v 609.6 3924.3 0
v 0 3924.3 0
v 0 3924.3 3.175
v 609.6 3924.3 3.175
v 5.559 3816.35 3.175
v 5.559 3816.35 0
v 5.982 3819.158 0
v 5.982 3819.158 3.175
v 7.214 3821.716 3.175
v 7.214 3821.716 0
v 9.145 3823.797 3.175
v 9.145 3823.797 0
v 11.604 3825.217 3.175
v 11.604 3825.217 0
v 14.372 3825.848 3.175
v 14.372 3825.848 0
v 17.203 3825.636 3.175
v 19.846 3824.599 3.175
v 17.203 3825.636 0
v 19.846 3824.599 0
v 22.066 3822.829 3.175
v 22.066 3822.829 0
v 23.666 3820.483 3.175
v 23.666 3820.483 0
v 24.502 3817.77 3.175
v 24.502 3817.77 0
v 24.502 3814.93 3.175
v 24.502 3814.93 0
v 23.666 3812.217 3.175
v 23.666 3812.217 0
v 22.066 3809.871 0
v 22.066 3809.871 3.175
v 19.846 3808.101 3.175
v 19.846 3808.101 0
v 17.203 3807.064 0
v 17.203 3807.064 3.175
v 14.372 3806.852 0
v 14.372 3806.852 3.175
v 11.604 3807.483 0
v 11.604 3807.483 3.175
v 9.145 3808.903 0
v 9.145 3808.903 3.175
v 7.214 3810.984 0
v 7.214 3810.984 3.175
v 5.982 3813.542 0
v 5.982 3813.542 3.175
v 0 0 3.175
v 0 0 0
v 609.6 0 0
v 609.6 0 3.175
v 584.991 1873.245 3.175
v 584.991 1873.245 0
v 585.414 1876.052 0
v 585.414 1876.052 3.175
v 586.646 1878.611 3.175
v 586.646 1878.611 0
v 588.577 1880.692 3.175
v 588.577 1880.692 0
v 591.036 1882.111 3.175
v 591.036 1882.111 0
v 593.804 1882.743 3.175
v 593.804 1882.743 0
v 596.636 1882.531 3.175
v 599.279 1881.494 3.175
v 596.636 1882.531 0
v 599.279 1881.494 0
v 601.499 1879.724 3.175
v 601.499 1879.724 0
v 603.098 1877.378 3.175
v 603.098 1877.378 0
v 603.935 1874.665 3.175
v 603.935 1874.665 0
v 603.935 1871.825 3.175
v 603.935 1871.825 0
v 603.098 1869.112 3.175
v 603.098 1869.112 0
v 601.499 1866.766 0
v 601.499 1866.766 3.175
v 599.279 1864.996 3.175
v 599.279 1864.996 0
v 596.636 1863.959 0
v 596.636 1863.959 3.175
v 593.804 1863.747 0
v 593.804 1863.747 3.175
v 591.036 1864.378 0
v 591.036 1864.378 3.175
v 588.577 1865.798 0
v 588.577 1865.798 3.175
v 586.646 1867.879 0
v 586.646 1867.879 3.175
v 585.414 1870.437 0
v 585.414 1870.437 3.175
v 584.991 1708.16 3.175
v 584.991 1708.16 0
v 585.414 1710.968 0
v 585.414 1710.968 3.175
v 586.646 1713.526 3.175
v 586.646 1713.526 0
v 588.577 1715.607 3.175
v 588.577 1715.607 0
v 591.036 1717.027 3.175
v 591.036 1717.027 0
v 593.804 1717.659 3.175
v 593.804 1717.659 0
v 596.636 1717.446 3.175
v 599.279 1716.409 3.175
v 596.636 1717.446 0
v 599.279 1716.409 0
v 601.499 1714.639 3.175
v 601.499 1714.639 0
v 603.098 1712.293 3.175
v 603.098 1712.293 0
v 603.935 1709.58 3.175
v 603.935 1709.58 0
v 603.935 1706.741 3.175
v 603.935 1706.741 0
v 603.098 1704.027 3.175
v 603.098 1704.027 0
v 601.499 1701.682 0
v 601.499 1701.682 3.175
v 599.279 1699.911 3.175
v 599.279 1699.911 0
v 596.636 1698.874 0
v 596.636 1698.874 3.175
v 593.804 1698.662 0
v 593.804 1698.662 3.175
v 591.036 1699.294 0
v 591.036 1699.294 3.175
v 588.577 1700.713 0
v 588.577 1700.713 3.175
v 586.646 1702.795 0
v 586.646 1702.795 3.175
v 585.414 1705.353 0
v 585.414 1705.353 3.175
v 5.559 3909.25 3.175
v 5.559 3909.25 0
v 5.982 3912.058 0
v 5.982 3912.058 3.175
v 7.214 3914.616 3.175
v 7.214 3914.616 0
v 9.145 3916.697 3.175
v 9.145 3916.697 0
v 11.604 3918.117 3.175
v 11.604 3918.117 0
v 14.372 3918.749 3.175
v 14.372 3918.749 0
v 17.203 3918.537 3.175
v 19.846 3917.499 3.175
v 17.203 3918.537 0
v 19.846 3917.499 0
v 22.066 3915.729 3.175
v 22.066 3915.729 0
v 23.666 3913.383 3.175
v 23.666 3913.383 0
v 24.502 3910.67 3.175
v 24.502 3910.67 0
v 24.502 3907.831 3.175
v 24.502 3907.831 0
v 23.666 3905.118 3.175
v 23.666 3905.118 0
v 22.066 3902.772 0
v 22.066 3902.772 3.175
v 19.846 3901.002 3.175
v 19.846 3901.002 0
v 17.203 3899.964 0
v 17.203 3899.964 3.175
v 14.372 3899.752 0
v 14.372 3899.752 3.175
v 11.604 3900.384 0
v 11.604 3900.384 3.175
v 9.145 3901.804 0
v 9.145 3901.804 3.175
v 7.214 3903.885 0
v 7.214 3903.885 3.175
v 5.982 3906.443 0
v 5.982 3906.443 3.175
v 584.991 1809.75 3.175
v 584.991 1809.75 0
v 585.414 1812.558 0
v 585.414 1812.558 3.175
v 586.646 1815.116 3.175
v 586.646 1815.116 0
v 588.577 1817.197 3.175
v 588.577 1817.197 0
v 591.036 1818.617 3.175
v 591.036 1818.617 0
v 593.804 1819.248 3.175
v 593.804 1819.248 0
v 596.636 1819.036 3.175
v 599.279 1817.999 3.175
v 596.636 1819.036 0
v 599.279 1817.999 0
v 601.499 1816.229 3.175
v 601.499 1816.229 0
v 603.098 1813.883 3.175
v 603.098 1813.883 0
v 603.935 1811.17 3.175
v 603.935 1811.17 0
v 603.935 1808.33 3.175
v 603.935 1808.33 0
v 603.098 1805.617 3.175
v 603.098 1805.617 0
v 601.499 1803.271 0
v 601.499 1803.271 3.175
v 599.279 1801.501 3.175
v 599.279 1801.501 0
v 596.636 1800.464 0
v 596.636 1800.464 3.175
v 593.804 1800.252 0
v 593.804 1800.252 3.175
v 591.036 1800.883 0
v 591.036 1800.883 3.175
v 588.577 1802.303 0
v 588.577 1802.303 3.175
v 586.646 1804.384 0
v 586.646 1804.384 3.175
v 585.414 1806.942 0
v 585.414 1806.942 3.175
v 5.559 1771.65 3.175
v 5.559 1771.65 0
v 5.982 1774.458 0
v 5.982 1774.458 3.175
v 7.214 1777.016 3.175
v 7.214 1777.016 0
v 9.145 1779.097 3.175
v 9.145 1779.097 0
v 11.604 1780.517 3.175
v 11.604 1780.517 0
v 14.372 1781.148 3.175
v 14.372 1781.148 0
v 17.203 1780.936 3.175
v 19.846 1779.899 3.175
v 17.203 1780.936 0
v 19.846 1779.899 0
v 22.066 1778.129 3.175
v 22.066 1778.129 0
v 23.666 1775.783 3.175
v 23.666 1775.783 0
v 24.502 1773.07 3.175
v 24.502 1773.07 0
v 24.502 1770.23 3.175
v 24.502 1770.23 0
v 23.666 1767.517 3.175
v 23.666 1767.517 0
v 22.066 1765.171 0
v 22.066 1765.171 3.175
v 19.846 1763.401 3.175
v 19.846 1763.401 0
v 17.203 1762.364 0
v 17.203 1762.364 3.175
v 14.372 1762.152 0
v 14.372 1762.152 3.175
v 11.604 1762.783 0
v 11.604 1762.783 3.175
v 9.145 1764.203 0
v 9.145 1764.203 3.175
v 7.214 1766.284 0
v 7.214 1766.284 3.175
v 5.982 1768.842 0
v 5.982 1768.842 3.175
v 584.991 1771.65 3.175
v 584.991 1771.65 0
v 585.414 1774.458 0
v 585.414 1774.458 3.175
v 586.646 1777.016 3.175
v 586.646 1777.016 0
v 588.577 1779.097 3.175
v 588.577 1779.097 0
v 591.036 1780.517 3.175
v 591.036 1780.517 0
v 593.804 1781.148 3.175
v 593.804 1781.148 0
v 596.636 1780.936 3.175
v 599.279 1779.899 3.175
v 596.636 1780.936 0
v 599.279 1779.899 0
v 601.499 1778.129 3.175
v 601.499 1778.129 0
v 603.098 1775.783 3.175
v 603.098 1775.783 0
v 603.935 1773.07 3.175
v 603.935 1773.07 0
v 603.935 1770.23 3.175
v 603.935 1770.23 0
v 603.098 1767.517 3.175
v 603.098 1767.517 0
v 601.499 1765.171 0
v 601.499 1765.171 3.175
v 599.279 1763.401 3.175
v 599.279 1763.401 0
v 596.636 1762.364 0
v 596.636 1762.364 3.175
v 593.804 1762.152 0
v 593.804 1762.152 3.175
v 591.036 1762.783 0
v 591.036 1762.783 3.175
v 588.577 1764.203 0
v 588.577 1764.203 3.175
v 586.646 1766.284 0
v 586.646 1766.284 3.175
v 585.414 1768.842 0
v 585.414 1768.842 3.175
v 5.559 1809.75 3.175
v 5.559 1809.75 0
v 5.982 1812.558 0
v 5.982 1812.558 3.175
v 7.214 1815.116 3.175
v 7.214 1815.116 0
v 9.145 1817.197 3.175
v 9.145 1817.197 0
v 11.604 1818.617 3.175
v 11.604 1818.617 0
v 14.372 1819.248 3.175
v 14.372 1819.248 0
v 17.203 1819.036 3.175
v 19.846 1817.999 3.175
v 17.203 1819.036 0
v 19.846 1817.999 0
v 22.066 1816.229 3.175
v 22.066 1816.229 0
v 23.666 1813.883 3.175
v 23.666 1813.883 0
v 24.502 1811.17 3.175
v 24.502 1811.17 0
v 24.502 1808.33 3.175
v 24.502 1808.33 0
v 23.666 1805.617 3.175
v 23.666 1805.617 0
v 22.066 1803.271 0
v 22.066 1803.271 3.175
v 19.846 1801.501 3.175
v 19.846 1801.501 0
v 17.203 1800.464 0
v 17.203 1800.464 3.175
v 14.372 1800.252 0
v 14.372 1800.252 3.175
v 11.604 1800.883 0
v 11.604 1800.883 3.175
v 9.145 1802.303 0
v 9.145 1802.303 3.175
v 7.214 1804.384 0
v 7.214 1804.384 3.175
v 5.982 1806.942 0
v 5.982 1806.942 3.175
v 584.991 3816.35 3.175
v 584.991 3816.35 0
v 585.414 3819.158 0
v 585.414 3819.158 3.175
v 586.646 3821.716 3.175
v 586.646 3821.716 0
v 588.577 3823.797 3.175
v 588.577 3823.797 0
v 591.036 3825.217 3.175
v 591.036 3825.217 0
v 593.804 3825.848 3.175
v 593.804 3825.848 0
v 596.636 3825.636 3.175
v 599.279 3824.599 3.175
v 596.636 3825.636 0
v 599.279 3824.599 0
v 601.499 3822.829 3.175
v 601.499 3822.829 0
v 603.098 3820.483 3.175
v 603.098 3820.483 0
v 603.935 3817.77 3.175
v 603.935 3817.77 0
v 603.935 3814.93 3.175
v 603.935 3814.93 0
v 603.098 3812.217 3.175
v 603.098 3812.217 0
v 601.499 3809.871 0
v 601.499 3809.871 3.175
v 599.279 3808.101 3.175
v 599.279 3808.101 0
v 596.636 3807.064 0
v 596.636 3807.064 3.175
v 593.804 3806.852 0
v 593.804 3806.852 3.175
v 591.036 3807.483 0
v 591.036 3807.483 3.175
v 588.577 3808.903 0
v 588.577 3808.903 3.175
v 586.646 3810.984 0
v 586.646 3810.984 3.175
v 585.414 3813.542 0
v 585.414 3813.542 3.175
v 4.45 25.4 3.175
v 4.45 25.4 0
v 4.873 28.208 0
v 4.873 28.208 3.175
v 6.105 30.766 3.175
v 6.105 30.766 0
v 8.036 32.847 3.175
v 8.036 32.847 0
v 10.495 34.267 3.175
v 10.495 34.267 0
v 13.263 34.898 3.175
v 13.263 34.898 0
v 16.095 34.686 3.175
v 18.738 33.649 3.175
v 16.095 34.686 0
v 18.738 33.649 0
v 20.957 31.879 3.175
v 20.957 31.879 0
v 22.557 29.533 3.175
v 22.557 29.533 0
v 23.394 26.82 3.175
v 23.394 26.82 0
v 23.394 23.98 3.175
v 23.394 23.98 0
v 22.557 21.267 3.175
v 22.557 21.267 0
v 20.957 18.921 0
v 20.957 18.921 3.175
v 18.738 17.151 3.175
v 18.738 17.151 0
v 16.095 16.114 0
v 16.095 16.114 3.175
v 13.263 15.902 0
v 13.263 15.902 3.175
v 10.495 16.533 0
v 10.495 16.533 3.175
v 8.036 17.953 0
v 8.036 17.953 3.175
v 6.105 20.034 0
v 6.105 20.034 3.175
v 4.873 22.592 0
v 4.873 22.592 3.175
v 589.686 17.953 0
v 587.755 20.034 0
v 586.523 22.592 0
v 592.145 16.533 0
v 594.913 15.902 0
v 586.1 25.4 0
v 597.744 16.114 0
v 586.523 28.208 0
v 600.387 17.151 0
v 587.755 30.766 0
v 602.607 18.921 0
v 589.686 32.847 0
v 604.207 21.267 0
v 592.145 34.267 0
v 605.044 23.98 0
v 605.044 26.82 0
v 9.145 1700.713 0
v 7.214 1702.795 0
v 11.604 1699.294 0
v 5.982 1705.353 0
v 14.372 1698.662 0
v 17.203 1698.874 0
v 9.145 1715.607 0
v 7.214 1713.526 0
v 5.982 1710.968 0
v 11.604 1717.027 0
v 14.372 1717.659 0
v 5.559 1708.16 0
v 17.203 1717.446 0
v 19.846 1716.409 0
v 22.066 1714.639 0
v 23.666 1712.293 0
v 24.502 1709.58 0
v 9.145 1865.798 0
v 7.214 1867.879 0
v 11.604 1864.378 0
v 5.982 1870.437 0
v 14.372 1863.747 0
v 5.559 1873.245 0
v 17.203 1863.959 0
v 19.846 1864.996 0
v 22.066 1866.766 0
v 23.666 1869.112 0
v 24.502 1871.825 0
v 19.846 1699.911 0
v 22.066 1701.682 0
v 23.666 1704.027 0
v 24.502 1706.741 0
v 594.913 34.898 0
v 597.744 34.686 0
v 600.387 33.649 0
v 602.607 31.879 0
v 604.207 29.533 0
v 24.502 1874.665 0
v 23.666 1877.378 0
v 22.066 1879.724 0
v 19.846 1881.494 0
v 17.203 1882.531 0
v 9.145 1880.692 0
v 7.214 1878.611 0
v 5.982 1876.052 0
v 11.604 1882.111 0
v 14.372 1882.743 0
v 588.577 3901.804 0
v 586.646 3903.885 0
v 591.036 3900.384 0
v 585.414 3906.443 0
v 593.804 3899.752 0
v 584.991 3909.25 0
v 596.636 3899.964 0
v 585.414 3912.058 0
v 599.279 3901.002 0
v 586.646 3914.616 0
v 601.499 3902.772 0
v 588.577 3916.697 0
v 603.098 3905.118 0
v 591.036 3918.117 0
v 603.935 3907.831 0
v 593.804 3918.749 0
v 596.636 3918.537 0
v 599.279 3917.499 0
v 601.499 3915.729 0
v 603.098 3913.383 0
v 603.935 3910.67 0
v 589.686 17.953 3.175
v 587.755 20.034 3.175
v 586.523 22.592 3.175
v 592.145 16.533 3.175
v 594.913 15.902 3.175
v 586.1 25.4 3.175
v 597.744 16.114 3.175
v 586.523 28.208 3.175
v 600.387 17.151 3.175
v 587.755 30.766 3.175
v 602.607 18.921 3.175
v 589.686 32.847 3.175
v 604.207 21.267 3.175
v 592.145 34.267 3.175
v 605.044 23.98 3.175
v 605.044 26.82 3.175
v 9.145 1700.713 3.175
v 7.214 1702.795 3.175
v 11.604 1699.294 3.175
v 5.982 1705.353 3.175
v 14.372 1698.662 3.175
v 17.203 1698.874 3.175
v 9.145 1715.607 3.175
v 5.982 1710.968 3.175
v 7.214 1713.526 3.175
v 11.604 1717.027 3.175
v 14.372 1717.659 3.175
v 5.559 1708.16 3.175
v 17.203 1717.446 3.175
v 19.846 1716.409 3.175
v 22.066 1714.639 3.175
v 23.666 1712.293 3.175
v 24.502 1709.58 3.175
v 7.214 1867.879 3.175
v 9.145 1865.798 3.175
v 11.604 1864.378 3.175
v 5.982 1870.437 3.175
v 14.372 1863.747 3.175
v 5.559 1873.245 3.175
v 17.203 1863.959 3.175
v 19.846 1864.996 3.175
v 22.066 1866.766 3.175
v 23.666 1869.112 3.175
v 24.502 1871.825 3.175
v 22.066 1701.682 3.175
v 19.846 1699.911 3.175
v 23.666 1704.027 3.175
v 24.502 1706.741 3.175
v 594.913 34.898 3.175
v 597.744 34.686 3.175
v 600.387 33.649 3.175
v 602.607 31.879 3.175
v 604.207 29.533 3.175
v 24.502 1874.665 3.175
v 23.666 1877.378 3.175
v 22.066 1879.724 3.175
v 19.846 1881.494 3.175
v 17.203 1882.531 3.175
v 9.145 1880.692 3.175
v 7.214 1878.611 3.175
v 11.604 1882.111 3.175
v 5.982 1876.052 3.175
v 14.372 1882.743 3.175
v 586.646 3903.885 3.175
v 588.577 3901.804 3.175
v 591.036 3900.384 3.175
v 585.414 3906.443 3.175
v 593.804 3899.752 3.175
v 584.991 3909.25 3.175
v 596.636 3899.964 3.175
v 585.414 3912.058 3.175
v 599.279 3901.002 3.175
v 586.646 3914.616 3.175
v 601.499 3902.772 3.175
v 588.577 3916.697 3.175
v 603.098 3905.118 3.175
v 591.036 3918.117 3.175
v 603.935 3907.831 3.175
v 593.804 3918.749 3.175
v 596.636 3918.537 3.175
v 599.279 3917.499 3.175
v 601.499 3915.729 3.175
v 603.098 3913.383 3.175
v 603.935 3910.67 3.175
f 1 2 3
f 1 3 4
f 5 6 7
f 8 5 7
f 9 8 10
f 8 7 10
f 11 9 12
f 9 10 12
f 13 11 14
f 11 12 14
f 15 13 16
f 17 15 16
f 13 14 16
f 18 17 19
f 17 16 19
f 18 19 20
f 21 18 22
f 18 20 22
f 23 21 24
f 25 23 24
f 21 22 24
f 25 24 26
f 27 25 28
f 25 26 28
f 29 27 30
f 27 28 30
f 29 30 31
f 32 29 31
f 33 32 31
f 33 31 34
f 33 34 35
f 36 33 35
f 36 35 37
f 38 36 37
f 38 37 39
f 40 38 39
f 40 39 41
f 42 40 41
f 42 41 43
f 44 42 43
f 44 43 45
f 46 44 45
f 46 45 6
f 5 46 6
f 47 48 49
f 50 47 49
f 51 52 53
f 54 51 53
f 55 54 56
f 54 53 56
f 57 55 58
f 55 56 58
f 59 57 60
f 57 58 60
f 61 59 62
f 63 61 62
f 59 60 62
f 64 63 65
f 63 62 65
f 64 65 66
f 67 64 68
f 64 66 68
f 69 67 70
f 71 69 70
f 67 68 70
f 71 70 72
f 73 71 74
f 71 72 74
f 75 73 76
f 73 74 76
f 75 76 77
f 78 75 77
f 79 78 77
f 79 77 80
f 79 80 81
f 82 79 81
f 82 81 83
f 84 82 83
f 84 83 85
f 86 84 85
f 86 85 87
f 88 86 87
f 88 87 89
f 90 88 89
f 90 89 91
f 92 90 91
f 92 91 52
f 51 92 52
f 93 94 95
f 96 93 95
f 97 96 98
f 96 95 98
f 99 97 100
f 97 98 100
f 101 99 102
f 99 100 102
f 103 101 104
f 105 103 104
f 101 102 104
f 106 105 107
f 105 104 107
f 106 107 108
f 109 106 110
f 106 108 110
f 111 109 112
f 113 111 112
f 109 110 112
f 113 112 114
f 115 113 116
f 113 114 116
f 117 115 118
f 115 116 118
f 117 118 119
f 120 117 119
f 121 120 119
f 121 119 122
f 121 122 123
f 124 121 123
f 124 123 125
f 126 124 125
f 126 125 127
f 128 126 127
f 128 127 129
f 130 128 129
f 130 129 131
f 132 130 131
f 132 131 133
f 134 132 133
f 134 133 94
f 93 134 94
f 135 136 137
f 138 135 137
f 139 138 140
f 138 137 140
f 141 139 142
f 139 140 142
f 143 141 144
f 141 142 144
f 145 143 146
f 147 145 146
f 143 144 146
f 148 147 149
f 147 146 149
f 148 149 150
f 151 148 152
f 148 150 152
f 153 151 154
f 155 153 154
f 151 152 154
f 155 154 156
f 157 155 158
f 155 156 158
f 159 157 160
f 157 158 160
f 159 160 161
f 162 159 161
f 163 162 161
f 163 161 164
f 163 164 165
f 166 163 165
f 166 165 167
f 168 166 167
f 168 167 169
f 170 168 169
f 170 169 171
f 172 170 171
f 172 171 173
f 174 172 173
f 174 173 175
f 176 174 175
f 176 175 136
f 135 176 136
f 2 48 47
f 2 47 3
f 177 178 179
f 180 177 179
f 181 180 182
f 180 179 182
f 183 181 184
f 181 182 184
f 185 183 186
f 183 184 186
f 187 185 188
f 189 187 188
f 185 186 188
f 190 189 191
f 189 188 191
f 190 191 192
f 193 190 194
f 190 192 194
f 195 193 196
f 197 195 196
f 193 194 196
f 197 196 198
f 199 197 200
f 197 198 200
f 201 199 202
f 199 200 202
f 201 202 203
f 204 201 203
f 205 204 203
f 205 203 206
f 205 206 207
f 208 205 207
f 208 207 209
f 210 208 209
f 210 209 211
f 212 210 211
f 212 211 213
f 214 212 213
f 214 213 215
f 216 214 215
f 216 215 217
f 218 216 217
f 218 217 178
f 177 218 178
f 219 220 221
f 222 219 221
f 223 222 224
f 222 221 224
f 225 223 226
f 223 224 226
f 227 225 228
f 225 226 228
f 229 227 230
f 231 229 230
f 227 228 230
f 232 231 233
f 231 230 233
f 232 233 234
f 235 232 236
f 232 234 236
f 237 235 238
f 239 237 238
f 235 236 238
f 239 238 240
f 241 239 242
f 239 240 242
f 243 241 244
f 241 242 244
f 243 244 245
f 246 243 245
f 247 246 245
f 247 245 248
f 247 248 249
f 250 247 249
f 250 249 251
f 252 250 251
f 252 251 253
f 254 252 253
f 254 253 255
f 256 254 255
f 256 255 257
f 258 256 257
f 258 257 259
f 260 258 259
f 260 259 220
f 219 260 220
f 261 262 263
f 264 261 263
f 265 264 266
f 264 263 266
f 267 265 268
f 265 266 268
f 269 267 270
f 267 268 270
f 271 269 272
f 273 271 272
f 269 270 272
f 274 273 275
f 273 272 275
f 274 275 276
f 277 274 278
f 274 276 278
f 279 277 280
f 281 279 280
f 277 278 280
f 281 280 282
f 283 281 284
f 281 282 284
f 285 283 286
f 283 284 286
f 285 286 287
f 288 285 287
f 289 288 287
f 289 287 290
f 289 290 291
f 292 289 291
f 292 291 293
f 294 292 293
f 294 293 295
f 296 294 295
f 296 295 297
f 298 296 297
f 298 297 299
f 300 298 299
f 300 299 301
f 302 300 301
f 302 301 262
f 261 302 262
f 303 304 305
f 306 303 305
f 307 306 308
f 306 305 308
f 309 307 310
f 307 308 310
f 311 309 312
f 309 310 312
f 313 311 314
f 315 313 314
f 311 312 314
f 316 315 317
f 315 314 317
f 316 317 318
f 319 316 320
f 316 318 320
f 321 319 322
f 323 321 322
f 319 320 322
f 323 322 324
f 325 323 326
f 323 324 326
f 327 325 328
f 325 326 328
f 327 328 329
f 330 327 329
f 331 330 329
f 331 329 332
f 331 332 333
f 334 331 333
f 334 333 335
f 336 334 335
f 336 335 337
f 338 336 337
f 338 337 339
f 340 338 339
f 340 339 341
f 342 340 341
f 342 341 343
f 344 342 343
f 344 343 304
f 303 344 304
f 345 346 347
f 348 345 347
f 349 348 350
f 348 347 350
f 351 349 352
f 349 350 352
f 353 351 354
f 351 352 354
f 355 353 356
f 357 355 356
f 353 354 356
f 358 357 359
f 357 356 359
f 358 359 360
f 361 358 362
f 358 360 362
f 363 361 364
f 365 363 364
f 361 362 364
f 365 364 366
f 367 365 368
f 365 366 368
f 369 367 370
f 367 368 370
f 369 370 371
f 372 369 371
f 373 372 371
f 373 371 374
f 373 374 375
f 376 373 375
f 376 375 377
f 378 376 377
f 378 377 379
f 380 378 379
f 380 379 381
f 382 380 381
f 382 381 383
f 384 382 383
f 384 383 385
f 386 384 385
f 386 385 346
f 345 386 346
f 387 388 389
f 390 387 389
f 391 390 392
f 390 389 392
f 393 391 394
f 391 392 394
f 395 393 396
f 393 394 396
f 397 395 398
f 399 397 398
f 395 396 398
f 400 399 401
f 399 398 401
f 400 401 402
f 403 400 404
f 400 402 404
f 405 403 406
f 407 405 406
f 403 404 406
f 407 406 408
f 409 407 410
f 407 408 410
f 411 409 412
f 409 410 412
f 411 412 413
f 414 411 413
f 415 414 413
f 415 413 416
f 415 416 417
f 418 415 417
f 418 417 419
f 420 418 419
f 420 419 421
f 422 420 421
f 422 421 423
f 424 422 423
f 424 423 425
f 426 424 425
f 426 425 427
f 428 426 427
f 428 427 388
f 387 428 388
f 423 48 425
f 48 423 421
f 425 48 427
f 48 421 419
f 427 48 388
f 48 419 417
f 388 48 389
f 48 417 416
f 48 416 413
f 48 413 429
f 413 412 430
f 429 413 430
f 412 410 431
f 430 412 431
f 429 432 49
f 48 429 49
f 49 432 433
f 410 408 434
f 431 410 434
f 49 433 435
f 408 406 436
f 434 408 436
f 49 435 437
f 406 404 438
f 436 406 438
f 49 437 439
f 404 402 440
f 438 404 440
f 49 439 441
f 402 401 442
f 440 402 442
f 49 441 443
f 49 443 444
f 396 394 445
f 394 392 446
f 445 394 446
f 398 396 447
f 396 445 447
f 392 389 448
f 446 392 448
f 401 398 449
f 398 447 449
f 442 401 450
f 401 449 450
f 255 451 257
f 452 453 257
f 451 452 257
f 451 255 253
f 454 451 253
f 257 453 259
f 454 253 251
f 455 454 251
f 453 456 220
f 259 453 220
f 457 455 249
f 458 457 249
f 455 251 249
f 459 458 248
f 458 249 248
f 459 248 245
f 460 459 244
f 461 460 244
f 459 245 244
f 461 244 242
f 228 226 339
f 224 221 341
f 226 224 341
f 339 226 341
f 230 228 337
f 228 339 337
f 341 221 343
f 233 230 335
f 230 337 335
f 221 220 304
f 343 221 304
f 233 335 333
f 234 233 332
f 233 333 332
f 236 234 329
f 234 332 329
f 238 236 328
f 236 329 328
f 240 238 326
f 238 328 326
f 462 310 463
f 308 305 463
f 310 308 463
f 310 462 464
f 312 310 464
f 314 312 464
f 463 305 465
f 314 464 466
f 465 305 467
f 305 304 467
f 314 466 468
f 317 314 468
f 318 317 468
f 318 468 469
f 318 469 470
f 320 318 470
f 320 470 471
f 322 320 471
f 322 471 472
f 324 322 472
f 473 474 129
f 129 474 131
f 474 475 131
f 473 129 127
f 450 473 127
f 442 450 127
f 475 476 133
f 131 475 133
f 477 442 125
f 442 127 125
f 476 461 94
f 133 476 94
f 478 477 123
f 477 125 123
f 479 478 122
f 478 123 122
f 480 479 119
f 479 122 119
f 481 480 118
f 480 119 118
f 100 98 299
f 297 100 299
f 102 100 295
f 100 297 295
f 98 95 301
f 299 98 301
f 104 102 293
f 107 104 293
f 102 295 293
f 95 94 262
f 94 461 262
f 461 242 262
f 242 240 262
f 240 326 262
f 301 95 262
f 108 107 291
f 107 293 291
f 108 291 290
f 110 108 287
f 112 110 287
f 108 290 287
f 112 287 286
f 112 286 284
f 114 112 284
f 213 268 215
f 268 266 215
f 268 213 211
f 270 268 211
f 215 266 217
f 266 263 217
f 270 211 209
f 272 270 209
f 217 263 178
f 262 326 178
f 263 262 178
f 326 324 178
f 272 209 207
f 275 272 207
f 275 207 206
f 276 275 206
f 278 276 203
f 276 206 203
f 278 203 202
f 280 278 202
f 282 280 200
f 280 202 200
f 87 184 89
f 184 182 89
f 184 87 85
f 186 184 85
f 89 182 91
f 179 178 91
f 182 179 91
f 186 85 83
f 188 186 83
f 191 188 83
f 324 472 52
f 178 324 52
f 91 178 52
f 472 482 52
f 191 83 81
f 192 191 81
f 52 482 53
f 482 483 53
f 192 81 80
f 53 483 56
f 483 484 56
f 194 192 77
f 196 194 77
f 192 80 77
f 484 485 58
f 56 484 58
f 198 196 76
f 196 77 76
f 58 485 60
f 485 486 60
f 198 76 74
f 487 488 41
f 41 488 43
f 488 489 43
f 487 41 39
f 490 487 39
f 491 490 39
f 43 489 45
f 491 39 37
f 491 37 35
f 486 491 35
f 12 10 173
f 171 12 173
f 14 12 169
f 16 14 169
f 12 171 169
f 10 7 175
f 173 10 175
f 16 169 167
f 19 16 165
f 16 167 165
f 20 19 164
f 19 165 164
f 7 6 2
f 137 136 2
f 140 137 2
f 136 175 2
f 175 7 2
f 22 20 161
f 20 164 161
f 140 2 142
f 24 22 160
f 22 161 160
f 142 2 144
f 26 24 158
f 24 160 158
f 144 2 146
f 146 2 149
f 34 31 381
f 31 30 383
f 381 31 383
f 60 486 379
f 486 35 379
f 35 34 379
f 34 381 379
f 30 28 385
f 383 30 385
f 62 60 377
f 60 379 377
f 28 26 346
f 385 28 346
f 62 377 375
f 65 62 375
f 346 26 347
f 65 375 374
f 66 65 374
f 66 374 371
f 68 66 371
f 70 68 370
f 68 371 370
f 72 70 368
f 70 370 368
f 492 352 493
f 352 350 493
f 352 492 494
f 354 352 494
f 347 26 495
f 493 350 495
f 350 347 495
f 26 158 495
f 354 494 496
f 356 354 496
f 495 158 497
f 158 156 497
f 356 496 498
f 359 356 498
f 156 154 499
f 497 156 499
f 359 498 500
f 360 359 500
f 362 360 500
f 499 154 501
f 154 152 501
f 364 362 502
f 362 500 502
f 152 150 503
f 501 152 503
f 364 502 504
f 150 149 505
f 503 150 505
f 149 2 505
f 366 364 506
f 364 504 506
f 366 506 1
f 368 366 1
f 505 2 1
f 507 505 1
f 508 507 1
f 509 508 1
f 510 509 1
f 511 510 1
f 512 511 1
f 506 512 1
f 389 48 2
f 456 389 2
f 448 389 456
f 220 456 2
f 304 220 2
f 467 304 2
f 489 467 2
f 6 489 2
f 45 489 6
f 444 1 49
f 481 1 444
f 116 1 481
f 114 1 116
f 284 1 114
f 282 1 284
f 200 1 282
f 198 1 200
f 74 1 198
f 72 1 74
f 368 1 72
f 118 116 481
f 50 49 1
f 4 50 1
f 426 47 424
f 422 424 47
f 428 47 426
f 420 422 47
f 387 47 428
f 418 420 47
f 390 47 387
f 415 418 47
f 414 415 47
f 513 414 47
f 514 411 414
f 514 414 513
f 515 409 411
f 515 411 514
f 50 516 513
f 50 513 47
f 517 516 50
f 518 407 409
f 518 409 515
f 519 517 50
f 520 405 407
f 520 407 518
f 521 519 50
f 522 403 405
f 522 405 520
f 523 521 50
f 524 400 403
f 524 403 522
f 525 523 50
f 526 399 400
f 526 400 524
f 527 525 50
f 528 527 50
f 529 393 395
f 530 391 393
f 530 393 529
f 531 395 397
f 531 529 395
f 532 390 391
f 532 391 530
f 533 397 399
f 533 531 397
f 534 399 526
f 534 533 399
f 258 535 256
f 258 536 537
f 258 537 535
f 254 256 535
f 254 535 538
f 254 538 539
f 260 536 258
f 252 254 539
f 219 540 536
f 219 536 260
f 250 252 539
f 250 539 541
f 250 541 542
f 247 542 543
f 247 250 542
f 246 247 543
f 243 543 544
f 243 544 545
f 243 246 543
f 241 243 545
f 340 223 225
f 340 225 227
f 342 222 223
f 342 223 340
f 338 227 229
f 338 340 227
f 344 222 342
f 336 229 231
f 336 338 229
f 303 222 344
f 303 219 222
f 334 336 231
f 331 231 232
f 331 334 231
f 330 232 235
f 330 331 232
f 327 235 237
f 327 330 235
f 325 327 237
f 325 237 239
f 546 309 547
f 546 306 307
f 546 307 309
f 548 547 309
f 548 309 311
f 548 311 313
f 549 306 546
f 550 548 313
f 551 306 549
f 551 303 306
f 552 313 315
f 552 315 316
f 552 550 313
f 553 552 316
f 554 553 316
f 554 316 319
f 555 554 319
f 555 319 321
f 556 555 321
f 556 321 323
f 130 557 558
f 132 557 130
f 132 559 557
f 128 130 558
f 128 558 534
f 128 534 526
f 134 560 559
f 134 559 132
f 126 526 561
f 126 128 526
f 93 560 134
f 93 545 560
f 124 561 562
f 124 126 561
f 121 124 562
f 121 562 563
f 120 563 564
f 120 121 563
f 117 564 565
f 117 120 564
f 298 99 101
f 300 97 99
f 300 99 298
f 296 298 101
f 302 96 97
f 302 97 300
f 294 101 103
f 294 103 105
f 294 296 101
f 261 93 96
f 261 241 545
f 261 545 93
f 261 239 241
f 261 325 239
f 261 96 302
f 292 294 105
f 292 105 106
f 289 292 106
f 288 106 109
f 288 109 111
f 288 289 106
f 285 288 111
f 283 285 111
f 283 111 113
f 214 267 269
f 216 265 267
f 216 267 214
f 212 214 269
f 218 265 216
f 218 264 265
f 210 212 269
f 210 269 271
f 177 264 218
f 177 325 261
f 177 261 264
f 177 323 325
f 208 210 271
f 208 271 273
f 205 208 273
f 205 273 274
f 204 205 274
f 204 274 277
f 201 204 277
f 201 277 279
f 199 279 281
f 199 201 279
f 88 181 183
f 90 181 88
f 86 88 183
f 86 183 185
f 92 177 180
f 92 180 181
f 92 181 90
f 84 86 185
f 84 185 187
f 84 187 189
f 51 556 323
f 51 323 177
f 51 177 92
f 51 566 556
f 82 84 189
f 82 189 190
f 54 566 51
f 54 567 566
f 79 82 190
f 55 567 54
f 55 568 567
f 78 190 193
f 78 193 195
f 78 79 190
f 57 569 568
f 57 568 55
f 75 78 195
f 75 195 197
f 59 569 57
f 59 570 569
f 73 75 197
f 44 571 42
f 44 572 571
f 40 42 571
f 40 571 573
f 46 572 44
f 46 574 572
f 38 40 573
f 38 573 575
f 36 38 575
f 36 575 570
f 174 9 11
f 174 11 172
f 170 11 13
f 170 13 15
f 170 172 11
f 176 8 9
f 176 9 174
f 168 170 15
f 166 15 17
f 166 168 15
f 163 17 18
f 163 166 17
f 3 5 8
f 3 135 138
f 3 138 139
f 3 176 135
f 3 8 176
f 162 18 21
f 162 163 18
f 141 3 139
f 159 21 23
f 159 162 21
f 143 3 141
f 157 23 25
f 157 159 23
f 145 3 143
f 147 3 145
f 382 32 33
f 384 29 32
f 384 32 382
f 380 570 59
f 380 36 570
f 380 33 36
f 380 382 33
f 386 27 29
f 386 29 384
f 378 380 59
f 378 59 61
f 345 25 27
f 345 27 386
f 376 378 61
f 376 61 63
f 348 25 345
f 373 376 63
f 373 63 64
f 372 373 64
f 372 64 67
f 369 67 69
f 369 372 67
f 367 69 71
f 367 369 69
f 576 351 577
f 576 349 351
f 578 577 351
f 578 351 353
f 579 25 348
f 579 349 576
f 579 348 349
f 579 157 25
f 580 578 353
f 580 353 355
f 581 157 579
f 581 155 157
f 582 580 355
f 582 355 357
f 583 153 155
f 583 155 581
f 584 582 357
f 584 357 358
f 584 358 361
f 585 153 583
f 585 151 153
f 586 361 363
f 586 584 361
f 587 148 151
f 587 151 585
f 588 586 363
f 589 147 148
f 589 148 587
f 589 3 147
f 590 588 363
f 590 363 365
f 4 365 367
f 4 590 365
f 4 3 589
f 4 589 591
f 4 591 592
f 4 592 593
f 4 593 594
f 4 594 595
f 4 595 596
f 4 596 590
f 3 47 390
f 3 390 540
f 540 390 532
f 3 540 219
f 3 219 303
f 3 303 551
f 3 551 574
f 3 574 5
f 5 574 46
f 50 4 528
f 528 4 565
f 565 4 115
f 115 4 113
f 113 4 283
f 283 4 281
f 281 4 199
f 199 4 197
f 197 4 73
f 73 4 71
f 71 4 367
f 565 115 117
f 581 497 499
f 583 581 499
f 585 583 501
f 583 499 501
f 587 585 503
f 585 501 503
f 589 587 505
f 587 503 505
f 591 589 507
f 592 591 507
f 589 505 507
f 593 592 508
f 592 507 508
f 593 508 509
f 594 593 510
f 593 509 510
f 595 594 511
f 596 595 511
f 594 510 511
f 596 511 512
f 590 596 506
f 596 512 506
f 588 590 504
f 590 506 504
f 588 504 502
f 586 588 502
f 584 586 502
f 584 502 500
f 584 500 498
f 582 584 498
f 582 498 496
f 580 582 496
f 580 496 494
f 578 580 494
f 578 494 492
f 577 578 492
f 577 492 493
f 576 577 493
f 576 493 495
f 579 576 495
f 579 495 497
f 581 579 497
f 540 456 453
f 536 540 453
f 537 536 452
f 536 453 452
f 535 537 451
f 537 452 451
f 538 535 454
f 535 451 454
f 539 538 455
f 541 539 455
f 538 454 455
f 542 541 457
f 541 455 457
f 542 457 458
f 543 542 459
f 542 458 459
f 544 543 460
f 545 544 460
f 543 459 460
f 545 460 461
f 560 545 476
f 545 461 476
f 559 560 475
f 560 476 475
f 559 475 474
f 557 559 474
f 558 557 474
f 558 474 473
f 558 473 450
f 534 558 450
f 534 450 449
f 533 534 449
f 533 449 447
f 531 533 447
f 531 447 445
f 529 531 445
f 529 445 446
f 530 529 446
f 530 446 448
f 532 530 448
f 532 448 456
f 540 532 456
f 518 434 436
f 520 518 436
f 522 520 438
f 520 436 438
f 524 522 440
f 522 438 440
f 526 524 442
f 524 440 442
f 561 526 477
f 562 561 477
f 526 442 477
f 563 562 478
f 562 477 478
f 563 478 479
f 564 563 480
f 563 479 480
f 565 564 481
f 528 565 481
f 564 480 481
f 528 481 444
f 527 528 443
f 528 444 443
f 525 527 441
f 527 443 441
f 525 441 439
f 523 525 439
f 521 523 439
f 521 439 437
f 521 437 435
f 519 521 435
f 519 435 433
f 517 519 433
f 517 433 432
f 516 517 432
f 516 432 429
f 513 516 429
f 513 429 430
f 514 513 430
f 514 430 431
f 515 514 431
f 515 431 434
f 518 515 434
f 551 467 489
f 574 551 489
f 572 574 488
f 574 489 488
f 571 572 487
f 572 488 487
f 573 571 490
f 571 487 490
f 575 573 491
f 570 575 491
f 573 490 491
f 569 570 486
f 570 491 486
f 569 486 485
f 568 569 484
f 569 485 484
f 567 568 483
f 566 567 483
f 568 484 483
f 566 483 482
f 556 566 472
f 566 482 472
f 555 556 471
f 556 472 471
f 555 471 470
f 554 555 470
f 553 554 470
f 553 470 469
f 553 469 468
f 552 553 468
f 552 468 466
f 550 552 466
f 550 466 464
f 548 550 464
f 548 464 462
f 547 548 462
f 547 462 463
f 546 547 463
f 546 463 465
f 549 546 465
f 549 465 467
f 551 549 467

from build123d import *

# Parameters (mm, degrees)
SKETCH1_W           = 609.6
SKETCH1_H           = 3924.3
BOSS_EXTRUDE1_DEPTH = 3.175
SKETCH3_R           = 9.525
CUT_EXTRUDE2_DEPTH  = 3972.366607432


with BuildPart() as part:
    # Sketch1 → Boss-Extrude1 (new body)
    with BuildSketch(Plane.XY):
        with Locations((304.8, 1962.15)):
            Rectangle(SKETCH1_W, SKETCH1_H)
    extrude(amount=BOSS_EXTRUDE1_DEPTH)

    # Sketch3 → Cut-Extrude2 (cut, through all)
    with BuildSketch(Plane(origin=(0, 0, 0), x_dir=(-1, 0, 0), z_dir=(0, 0, -1))):
        with Locations((-594.51621, 3909.2505)):
            Circle(SKETCH3_R)
        with Locations((-594.51621, 3816.35)):
            Circle(SKETCH3_R)
        with Locations((-594.51621, 1873.24492)):
            Circle(SKETCH3_R)
        with Locations((-594.51621, 1809.75)):
            Circle(SKETCH3_R)
        with Locations((-594.51621, 1771.65)):
            Circle(SKETCH3_R)
        with Locations((-594.51621, 1708.16016)):
            Circle(SKETCH3_R)
        with Locations((-595.62492, 25.4)):
            Circle(SKETCH3_R)
        with Locations((-15.08379, 3909.2505)):
            Circle(SKETCH3_R)
        with Locations((-15.08379, 3816.35)):
            Circle(SKETCH3_R)
        with Locations((-15.08379, 1873.24492)):
            Circle(SKETCH3_R)
        with Locations((-15.08379, 1809.75)):
            Circle(SKETCH3_R)
        with Locations((-15.08379, 1771.65)):
            Circle(SKETCH3_R)
        with Locations((-15.08379, 1708.16016)):
            Circle(SKETCH3_R)
        with Locations((-13.97508, 25.4)):
            Circle(SKETCH3_R)
    extrude(amount=-CUT_EXTRUDE2_DEPTH, mode=Mode.SUBTRACT)


solid = part.part
